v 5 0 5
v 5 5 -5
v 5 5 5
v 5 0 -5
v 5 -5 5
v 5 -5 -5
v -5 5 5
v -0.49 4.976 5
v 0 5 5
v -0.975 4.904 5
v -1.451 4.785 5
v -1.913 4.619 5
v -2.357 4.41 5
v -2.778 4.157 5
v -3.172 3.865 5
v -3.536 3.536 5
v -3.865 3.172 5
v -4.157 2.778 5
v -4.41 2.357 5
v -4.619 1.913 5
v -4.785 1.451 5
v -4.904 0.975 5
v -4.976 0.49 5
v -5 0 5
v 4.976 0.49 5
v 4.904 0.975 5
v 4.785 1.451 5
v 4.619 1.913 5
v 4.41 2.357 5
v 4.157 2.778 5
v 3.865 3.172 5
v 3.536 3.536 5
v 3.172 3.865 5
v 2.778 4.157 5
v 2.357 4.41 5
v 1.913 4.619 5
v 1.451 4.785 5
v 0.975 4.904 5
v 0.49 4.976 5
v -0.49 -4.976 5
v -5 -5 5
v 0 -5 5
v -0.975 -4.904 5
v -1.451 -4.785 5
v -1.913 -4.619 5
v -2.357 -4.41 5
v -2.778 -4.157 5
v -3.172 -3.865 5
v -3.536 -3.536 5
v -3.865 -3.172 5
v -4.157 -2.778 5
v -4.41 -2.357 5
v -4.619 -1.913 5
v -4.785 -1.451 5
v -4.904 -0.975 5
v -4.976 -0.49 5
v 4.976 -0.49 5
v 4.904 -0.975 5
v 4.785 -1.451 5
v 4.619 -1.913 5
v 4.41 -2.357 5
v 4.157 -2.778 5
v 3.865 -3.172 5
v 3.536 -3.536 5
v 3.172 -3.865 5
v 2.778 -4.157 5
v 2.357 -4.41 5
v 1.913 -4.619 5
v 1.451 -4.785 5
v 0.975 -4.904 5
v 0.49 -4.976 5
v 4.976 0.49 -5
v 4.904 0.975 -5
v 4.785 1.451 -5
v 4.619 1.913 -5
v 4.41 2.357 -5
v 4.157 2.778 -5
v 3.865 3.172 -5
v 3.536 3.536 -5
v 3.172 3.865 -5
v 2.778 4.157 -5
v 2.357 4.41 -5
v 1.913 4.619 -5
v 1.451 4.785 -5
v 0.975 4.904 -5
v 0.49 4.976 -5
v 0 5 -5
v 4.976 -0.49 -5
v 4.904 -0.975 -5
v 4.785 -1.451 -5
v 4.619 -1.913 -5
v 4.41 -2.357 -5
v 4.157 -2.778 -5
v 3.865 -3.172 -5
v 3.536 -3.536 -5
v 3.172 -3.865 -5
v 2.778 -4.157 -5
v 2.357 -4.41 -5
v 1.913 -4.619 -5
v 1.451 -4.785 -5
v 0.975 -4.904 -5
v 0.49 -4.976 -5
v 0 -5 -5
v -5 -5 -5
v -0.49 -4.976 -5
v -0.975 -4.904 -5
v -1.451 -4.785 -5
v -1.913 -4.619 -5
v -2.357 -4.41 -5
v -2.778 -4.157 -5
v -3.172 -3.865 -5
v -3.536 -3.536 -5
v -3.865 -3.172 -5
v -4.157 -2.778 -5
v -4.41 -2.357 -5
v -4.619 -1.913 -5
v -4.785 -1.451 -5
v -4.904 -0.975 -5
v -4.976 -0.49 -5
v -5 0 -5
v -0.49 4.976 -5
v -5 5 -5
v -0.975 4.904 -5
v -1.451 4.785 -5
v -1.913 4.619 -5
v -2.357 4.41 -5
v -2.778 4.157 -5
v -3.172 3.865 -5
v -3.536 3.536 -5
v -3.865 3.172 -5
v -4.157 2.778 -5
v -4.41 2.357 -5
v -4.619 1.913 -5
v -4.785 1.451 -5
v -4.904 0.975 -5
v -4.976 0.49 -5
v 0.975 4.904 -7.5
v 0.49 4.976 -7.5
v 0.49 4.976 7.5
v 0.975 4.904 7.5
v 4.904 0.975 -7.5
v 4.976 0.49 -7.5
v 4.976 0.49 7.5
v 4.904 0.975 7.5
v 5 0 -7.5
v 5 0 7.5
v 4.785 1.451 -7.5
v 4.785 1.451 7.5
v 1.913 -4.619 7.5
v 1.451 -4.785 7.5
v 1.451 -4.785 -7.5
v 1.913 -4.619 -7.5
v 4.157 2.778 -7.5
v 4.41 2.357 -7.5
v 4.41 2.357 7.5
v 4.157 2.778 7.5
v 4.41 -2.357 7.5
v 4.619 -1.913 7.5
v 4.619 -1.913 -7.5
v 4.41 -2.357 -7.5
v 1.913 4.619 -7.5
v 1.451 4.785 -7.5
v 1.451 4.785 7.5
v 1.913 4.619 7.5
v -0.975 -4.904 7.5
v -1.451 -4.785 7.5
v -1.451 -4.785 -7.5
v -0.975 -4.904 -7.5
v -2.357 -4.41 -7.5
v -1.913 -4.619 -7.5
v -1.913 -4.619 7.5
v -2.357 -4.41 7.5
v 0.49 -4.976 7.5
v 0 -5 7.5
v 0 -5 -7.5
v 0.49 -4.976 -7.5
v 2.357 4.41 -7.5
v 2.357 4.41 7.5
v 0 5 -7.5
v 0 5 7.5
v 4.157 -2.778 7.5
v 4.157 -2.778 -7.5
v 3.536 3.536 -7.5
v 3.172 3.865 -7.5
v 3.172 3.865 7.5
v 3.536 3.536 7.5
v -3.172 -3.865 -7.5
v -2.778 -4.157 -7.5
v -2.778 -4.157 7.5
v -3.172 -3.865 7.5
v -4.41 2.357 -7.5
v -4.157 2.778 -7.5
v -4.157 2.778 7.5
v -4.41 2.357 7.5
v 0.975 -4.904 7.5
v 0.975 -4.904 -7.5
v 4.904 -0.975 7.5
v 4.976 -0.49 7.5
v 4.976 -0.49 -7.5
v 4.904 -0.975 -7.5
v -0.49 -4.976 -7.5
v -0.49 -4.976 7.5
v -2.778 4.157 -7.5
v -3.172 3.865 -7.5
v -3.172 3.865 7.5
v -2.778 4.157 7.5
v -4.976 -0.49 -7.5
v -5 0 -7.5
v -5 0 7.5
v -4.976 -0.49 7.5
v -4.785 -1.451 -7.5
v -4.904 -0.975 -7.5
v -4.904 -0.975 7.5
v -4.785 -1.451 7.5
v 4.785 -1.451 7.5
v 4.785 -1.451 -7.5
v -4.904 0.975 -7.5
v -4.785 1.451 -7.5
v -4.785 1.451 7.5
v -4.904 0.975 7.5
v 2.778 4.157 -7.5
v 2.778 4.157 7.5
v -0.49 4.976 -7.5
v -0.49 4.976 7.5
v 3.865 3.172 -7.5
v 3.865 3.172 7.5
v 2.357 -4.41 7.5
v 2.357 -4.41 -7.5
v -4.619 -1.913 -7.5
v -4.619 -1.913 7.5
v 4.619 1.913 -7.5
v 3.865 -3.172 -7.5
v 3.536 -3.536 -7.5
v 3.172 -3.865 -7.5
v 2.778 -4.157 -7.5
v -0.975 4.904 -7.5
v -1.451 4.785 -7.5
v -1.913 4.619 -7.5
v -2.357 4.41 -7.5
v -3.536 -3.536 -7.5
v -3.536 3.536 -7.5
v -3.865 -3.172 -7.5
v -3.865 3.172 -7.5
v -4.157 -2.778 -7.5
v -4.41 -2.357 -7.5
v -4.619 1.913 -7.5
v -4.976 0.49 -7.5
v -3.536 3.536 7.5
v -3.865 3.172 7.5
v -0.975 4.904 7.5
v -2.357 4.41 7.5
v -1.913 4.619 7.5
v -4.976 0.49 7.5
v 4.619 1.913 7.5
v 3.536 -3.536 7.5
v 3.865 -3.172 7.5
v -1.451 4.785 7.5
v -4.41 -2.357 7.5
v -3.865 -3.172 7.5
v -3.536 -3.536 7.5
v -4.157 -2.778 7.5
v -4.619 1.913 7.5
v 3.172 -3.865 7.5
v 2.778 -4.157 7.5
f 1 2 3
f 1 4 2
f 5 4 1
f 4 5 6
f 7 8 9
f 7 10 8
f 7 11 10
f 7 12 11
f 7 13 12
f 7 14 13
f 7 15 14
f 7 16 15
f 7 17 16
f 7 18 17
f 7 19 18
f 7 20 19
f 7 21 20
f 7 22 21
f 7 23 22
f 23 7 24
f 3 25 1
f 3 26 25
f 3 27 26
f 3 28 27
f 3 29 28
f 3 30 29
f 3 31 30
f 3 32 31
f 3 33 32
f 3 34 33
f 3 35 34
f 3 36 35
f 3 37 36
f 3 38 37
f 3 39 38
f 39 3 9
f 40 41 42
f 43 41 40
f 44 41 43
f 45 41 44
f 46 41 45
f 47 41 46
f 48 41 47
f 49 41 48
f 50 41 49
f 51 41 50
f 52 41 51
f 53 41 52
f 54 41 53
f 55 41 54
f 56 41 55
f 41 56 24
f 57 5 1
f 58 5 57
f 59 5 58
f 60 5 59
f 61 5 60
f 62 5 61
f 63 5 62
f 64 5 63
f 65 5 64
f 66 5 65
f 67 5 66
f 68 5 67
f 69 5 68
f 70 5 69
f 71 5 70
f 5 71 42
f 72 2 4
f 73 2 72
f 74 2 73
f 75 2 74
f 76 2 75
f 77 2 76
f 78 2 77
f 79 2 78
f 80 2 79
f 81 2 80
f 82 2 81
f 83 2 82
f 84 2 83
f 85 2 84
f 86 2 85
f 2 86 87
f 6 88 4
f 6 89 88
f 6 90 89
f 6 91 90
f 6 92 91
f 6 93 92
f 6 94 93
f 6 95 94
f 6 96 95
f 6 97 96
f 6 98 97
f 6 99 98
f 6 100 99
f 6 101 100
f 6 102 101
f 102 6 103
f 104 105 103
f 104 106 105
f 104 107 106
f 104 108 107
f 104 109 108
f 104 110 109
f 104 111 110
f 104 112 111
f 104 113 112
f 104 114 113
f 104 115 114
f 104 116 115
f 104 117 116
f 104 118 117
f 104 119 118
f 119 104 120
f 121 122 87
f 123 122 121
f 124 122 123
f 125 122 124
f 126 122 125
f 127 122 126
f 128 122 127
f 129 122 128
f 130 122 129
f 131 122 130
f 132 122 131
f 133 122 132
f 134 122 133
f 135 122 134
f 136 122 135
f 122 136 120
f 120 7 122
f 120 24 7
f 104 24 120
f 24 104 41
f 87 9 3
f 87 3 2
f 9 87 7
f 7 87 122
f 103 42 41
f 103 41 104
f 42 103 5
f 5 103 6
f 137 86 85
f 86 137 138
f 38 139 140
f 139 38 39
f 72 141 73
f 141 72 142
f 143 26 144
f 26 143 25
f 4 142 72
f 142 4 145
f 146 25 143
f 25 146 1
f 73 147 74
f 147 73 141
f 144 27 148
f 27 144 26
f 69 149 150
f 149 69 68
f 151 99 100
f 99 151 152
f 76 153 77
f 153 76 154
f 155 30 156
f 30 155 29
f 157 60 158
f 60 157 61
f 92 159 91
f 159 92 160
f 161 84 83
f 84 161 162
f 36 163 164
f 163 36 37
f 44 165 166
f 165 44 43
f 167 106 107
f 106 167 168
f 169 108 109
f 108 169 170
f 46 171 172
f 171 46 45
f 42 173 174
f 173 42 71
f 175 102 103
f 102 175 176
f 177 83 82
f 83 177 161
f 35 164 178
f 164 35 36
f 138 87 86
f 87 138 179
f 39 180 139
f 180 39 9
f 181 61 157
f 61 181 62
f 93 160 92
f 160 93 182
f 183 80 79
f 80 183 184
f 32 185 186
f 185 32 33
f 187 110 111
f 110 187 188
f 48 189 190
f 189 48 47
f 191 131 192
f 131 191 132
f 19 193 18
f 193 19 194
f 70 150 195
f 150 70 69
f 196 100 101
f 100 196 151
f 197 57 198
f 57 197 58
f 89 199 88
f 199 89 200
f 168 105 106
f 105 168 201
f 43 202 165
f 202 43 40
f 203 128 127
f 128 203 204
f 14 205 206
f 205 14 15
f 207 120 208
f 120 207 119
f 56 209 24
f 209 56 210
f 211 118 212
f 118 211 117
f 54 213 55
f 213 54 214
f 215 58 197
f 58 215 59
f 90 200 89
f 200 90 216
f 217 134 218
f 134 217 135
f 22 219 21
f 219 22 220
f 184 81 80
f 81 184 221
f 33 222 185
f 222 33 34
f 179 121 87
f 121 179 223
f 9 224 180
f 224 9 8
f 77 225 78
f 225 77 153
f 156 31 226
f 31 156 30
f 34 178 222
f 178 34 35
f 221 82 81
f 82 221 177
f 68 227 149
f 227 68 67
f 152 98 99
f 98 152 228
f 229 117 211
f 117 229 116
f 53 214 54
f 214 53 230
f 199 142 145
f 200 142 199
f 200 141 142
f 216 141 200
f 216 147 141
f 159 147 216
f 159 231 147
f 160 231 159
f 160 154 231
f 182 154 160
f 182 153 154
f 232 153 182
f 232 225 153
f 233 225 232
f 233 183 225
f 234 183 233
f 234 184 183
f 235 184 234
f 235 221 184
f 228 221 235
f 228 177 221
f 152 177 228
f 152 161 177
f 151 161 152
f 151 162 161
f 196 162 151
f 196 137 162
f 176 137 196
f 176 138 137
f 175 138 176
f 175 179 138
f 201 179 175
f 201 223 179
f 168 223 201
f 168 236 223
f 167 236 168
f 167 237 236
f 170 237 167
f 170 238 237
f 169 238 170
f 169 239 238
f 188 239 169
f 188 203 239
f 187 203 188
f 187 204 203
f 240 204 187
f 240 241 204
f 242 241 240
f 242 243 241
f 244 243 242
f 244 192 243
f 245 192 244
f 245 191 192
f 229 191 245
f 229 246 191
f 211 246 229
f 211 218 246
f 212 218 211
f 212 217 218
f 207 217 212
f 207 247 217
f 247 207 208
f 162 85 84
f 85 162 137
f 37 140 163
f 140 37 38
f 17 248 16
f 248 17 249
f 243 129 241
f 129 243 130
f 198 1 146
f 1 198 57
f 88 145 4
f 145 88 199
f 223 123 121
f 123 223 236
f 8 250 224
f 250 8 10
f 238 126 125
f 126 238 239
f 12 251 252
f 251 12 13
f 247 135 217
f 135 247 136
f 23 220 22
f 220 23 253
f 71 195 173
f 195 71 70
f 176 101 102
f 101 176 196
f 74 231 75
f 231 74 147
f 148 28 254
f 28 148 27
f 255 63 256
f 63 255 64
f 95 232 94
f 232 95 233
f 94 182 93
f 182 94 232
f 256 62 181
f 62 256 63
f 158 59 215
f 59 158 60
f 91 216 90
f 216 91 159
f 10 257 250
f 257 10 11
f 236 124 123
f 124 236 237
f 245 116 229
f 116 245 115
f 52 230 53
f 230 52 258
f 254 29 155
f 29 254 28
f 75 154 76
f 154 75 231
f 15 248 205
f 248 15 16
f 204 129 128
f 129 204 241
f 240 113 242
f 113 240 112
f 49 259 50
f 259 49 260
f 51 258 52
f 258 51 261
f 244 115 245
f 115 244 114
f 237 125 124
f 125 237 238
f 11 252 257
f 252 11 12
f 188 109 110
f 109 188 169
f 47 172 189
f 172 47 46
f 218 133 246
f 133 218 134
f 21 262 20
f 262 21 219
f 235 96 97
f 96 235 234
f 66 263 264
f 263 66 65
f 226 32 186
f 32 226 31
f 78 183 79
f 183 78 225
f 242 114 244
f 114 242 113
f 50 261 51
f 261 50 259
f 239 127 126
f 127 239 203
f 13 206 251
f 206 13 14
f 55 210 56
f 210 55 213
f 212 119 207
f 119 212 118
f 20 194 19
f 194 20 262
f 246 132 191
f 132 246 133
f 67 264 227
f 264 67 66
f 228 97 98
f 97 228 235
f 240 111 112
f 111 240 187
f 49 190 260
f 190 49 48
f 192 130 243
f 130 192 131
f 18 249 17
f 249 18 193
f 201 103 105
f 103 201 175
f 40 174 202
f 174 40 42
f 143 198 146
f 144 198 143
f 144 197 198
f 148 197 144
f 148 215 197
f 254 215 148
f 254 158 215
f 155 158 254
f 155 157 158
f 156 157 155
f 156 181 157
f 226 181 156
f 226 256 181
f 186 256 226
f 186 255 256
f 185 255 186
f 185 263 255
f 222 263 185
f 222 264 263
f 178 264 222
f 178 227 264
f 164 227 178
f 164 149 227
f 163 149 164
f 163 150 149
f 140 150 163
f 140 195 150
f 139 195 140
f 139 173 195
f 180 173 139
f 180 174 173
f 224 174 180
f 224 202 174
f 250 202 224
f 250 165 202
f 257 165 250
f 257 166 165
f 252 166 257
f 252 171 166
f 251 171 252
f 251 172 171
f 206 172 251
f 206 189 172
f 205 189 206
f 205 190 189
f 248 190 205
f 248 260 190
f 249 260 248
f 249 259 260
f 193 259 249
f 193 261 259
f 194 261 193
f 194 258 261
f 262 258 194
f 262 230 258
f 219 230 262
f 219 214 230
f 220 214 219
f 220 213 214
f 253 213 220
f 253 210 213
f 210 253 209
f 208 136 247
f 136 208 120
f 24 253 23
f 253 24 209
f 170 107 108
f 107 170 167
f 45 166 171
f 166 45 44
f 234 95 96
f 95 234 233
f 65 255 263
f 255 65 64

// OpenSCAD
// Set fragment number for roundings
$fn = $preview ? 32 : 64;

// Name variables so you know what they are for!

// Size of the Cube in the X-direction (width)
cuSizeX = 10;

// Size of the Cube in the Y-direction (depth)
cuSizeY = 10;

// Size of the Cube in the Z-direction (height)
cuSizeZ = 10;

// The diameter of the Cylinder
cyDia = 10;

// The height of the Cylinder
cyHei = 15;

cube(size = [cuSizeX, cuSizeY, cuSizeZ], center = true);
cylinder(d = cyDia, h = cyHei, center = true);
